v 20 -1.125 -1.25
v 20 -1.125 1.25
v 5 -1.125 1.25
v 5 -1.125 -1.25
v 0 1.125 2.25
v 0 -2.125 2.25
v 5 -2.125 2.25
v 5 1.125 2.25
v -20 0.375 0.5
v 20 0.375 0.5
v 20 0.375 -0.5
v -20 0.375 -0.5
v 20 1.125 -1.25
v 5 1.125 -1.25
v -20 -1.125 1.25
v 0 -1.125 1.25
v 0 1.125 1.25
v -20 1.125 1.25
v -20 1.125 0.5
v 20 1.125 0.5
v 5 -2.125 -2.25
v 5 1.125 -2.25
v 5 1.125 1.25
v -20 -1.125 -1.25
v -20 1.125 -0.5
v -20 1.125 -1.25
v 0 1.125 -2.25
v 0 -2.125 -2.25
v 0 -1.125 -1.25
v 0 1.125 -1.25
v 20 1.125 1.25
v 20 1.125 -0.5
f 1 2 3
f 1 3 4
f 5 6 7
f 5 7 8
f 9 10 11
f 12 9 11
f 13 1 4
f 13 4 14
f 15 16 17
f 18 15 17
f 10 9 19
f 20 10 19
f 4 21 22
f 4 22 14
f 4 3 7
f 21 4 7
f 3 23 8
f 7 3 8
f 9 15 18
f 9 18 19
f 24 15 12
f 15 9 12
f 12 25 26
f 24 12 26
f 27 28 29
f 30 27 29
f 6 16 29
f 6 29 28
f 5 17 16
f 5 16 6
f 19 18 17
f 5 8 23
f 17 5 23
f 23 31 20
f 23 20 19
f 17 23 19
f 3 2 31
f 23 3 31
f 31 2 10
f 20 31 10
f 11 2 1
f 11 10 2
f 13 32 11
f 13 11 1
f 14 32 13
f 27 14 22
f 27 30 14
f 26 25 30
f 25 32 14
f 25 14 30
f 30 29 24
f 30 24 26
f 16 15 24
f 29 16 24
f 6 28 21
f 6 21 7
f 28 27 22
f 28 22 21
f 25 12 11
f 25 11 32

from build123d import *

# Parameters (mm, degrees)
SKETCH6_W               = 2.5
SKETCH6_H               = 2.25
BOSS_EXTRUDE1_DEPTH     = 20
CUT_EXTRUDE1_DEPTH      = 21.070578592
CUT_EXTRUDE1_DEPTH_BACK = 21.070578592
SKETCH7_W               = 1
SKETCH7_H               = 0.75
BOSS_EXTRUDE2_DEPTH     = 5


with BuildPart() as part:
    # Sketch6 → Boss-Extrude1 (new, symmetric)
    with BuildSketch(Plane(origin=(0, 0, 0), x_dir=(0, 0, -1), z_dir=(1, 0, 0))):
        Rectangle(SKETCH6_W, SKETCH6_H)
    extrude(amount=BOSS_EXTRUDE1_DEPTH, both=True)

    # Sketch7 → Cut-Extrude1 (cut, two sides: drawn at the far end of the back side and taken through both)
    with BuildSketch(Plane(origin=(0, 0, 0), x_dir=(0, 0, -1), z_dir=(1, 0, 0)).offset(-CUT_EXTRUDE1_DEPTH_BACK)):
        with Locations((0, 0.75)):
            Rectangle(SKETCH7_W, SKETCH7_H)
    extrude(amount=CUT_EXTRUDE1_DEPTH + CUT_EXTRUDE1_DEPTH_BACK, mode=Mode.SUBTRACT)

    # Sketch8 → Boss-Extrude2 (add)
    with BuildSketch(Plane(origin=(0, 0, 0), x_dir=(0, 0, -1), z_dir=(1, 0, 0))):
        Polygon((-2.25, 1.125), (-1.25, 1.125), (-1.25, -1.125), (1.25, -1.125), (1.25, 1.125), (2.25, 1.125), (2.25, -2.125), (-2.25, -2.125), align=None)
    extrude(amount=BOSS_EXTRUDE2_DEPTH)


solid = part.part
